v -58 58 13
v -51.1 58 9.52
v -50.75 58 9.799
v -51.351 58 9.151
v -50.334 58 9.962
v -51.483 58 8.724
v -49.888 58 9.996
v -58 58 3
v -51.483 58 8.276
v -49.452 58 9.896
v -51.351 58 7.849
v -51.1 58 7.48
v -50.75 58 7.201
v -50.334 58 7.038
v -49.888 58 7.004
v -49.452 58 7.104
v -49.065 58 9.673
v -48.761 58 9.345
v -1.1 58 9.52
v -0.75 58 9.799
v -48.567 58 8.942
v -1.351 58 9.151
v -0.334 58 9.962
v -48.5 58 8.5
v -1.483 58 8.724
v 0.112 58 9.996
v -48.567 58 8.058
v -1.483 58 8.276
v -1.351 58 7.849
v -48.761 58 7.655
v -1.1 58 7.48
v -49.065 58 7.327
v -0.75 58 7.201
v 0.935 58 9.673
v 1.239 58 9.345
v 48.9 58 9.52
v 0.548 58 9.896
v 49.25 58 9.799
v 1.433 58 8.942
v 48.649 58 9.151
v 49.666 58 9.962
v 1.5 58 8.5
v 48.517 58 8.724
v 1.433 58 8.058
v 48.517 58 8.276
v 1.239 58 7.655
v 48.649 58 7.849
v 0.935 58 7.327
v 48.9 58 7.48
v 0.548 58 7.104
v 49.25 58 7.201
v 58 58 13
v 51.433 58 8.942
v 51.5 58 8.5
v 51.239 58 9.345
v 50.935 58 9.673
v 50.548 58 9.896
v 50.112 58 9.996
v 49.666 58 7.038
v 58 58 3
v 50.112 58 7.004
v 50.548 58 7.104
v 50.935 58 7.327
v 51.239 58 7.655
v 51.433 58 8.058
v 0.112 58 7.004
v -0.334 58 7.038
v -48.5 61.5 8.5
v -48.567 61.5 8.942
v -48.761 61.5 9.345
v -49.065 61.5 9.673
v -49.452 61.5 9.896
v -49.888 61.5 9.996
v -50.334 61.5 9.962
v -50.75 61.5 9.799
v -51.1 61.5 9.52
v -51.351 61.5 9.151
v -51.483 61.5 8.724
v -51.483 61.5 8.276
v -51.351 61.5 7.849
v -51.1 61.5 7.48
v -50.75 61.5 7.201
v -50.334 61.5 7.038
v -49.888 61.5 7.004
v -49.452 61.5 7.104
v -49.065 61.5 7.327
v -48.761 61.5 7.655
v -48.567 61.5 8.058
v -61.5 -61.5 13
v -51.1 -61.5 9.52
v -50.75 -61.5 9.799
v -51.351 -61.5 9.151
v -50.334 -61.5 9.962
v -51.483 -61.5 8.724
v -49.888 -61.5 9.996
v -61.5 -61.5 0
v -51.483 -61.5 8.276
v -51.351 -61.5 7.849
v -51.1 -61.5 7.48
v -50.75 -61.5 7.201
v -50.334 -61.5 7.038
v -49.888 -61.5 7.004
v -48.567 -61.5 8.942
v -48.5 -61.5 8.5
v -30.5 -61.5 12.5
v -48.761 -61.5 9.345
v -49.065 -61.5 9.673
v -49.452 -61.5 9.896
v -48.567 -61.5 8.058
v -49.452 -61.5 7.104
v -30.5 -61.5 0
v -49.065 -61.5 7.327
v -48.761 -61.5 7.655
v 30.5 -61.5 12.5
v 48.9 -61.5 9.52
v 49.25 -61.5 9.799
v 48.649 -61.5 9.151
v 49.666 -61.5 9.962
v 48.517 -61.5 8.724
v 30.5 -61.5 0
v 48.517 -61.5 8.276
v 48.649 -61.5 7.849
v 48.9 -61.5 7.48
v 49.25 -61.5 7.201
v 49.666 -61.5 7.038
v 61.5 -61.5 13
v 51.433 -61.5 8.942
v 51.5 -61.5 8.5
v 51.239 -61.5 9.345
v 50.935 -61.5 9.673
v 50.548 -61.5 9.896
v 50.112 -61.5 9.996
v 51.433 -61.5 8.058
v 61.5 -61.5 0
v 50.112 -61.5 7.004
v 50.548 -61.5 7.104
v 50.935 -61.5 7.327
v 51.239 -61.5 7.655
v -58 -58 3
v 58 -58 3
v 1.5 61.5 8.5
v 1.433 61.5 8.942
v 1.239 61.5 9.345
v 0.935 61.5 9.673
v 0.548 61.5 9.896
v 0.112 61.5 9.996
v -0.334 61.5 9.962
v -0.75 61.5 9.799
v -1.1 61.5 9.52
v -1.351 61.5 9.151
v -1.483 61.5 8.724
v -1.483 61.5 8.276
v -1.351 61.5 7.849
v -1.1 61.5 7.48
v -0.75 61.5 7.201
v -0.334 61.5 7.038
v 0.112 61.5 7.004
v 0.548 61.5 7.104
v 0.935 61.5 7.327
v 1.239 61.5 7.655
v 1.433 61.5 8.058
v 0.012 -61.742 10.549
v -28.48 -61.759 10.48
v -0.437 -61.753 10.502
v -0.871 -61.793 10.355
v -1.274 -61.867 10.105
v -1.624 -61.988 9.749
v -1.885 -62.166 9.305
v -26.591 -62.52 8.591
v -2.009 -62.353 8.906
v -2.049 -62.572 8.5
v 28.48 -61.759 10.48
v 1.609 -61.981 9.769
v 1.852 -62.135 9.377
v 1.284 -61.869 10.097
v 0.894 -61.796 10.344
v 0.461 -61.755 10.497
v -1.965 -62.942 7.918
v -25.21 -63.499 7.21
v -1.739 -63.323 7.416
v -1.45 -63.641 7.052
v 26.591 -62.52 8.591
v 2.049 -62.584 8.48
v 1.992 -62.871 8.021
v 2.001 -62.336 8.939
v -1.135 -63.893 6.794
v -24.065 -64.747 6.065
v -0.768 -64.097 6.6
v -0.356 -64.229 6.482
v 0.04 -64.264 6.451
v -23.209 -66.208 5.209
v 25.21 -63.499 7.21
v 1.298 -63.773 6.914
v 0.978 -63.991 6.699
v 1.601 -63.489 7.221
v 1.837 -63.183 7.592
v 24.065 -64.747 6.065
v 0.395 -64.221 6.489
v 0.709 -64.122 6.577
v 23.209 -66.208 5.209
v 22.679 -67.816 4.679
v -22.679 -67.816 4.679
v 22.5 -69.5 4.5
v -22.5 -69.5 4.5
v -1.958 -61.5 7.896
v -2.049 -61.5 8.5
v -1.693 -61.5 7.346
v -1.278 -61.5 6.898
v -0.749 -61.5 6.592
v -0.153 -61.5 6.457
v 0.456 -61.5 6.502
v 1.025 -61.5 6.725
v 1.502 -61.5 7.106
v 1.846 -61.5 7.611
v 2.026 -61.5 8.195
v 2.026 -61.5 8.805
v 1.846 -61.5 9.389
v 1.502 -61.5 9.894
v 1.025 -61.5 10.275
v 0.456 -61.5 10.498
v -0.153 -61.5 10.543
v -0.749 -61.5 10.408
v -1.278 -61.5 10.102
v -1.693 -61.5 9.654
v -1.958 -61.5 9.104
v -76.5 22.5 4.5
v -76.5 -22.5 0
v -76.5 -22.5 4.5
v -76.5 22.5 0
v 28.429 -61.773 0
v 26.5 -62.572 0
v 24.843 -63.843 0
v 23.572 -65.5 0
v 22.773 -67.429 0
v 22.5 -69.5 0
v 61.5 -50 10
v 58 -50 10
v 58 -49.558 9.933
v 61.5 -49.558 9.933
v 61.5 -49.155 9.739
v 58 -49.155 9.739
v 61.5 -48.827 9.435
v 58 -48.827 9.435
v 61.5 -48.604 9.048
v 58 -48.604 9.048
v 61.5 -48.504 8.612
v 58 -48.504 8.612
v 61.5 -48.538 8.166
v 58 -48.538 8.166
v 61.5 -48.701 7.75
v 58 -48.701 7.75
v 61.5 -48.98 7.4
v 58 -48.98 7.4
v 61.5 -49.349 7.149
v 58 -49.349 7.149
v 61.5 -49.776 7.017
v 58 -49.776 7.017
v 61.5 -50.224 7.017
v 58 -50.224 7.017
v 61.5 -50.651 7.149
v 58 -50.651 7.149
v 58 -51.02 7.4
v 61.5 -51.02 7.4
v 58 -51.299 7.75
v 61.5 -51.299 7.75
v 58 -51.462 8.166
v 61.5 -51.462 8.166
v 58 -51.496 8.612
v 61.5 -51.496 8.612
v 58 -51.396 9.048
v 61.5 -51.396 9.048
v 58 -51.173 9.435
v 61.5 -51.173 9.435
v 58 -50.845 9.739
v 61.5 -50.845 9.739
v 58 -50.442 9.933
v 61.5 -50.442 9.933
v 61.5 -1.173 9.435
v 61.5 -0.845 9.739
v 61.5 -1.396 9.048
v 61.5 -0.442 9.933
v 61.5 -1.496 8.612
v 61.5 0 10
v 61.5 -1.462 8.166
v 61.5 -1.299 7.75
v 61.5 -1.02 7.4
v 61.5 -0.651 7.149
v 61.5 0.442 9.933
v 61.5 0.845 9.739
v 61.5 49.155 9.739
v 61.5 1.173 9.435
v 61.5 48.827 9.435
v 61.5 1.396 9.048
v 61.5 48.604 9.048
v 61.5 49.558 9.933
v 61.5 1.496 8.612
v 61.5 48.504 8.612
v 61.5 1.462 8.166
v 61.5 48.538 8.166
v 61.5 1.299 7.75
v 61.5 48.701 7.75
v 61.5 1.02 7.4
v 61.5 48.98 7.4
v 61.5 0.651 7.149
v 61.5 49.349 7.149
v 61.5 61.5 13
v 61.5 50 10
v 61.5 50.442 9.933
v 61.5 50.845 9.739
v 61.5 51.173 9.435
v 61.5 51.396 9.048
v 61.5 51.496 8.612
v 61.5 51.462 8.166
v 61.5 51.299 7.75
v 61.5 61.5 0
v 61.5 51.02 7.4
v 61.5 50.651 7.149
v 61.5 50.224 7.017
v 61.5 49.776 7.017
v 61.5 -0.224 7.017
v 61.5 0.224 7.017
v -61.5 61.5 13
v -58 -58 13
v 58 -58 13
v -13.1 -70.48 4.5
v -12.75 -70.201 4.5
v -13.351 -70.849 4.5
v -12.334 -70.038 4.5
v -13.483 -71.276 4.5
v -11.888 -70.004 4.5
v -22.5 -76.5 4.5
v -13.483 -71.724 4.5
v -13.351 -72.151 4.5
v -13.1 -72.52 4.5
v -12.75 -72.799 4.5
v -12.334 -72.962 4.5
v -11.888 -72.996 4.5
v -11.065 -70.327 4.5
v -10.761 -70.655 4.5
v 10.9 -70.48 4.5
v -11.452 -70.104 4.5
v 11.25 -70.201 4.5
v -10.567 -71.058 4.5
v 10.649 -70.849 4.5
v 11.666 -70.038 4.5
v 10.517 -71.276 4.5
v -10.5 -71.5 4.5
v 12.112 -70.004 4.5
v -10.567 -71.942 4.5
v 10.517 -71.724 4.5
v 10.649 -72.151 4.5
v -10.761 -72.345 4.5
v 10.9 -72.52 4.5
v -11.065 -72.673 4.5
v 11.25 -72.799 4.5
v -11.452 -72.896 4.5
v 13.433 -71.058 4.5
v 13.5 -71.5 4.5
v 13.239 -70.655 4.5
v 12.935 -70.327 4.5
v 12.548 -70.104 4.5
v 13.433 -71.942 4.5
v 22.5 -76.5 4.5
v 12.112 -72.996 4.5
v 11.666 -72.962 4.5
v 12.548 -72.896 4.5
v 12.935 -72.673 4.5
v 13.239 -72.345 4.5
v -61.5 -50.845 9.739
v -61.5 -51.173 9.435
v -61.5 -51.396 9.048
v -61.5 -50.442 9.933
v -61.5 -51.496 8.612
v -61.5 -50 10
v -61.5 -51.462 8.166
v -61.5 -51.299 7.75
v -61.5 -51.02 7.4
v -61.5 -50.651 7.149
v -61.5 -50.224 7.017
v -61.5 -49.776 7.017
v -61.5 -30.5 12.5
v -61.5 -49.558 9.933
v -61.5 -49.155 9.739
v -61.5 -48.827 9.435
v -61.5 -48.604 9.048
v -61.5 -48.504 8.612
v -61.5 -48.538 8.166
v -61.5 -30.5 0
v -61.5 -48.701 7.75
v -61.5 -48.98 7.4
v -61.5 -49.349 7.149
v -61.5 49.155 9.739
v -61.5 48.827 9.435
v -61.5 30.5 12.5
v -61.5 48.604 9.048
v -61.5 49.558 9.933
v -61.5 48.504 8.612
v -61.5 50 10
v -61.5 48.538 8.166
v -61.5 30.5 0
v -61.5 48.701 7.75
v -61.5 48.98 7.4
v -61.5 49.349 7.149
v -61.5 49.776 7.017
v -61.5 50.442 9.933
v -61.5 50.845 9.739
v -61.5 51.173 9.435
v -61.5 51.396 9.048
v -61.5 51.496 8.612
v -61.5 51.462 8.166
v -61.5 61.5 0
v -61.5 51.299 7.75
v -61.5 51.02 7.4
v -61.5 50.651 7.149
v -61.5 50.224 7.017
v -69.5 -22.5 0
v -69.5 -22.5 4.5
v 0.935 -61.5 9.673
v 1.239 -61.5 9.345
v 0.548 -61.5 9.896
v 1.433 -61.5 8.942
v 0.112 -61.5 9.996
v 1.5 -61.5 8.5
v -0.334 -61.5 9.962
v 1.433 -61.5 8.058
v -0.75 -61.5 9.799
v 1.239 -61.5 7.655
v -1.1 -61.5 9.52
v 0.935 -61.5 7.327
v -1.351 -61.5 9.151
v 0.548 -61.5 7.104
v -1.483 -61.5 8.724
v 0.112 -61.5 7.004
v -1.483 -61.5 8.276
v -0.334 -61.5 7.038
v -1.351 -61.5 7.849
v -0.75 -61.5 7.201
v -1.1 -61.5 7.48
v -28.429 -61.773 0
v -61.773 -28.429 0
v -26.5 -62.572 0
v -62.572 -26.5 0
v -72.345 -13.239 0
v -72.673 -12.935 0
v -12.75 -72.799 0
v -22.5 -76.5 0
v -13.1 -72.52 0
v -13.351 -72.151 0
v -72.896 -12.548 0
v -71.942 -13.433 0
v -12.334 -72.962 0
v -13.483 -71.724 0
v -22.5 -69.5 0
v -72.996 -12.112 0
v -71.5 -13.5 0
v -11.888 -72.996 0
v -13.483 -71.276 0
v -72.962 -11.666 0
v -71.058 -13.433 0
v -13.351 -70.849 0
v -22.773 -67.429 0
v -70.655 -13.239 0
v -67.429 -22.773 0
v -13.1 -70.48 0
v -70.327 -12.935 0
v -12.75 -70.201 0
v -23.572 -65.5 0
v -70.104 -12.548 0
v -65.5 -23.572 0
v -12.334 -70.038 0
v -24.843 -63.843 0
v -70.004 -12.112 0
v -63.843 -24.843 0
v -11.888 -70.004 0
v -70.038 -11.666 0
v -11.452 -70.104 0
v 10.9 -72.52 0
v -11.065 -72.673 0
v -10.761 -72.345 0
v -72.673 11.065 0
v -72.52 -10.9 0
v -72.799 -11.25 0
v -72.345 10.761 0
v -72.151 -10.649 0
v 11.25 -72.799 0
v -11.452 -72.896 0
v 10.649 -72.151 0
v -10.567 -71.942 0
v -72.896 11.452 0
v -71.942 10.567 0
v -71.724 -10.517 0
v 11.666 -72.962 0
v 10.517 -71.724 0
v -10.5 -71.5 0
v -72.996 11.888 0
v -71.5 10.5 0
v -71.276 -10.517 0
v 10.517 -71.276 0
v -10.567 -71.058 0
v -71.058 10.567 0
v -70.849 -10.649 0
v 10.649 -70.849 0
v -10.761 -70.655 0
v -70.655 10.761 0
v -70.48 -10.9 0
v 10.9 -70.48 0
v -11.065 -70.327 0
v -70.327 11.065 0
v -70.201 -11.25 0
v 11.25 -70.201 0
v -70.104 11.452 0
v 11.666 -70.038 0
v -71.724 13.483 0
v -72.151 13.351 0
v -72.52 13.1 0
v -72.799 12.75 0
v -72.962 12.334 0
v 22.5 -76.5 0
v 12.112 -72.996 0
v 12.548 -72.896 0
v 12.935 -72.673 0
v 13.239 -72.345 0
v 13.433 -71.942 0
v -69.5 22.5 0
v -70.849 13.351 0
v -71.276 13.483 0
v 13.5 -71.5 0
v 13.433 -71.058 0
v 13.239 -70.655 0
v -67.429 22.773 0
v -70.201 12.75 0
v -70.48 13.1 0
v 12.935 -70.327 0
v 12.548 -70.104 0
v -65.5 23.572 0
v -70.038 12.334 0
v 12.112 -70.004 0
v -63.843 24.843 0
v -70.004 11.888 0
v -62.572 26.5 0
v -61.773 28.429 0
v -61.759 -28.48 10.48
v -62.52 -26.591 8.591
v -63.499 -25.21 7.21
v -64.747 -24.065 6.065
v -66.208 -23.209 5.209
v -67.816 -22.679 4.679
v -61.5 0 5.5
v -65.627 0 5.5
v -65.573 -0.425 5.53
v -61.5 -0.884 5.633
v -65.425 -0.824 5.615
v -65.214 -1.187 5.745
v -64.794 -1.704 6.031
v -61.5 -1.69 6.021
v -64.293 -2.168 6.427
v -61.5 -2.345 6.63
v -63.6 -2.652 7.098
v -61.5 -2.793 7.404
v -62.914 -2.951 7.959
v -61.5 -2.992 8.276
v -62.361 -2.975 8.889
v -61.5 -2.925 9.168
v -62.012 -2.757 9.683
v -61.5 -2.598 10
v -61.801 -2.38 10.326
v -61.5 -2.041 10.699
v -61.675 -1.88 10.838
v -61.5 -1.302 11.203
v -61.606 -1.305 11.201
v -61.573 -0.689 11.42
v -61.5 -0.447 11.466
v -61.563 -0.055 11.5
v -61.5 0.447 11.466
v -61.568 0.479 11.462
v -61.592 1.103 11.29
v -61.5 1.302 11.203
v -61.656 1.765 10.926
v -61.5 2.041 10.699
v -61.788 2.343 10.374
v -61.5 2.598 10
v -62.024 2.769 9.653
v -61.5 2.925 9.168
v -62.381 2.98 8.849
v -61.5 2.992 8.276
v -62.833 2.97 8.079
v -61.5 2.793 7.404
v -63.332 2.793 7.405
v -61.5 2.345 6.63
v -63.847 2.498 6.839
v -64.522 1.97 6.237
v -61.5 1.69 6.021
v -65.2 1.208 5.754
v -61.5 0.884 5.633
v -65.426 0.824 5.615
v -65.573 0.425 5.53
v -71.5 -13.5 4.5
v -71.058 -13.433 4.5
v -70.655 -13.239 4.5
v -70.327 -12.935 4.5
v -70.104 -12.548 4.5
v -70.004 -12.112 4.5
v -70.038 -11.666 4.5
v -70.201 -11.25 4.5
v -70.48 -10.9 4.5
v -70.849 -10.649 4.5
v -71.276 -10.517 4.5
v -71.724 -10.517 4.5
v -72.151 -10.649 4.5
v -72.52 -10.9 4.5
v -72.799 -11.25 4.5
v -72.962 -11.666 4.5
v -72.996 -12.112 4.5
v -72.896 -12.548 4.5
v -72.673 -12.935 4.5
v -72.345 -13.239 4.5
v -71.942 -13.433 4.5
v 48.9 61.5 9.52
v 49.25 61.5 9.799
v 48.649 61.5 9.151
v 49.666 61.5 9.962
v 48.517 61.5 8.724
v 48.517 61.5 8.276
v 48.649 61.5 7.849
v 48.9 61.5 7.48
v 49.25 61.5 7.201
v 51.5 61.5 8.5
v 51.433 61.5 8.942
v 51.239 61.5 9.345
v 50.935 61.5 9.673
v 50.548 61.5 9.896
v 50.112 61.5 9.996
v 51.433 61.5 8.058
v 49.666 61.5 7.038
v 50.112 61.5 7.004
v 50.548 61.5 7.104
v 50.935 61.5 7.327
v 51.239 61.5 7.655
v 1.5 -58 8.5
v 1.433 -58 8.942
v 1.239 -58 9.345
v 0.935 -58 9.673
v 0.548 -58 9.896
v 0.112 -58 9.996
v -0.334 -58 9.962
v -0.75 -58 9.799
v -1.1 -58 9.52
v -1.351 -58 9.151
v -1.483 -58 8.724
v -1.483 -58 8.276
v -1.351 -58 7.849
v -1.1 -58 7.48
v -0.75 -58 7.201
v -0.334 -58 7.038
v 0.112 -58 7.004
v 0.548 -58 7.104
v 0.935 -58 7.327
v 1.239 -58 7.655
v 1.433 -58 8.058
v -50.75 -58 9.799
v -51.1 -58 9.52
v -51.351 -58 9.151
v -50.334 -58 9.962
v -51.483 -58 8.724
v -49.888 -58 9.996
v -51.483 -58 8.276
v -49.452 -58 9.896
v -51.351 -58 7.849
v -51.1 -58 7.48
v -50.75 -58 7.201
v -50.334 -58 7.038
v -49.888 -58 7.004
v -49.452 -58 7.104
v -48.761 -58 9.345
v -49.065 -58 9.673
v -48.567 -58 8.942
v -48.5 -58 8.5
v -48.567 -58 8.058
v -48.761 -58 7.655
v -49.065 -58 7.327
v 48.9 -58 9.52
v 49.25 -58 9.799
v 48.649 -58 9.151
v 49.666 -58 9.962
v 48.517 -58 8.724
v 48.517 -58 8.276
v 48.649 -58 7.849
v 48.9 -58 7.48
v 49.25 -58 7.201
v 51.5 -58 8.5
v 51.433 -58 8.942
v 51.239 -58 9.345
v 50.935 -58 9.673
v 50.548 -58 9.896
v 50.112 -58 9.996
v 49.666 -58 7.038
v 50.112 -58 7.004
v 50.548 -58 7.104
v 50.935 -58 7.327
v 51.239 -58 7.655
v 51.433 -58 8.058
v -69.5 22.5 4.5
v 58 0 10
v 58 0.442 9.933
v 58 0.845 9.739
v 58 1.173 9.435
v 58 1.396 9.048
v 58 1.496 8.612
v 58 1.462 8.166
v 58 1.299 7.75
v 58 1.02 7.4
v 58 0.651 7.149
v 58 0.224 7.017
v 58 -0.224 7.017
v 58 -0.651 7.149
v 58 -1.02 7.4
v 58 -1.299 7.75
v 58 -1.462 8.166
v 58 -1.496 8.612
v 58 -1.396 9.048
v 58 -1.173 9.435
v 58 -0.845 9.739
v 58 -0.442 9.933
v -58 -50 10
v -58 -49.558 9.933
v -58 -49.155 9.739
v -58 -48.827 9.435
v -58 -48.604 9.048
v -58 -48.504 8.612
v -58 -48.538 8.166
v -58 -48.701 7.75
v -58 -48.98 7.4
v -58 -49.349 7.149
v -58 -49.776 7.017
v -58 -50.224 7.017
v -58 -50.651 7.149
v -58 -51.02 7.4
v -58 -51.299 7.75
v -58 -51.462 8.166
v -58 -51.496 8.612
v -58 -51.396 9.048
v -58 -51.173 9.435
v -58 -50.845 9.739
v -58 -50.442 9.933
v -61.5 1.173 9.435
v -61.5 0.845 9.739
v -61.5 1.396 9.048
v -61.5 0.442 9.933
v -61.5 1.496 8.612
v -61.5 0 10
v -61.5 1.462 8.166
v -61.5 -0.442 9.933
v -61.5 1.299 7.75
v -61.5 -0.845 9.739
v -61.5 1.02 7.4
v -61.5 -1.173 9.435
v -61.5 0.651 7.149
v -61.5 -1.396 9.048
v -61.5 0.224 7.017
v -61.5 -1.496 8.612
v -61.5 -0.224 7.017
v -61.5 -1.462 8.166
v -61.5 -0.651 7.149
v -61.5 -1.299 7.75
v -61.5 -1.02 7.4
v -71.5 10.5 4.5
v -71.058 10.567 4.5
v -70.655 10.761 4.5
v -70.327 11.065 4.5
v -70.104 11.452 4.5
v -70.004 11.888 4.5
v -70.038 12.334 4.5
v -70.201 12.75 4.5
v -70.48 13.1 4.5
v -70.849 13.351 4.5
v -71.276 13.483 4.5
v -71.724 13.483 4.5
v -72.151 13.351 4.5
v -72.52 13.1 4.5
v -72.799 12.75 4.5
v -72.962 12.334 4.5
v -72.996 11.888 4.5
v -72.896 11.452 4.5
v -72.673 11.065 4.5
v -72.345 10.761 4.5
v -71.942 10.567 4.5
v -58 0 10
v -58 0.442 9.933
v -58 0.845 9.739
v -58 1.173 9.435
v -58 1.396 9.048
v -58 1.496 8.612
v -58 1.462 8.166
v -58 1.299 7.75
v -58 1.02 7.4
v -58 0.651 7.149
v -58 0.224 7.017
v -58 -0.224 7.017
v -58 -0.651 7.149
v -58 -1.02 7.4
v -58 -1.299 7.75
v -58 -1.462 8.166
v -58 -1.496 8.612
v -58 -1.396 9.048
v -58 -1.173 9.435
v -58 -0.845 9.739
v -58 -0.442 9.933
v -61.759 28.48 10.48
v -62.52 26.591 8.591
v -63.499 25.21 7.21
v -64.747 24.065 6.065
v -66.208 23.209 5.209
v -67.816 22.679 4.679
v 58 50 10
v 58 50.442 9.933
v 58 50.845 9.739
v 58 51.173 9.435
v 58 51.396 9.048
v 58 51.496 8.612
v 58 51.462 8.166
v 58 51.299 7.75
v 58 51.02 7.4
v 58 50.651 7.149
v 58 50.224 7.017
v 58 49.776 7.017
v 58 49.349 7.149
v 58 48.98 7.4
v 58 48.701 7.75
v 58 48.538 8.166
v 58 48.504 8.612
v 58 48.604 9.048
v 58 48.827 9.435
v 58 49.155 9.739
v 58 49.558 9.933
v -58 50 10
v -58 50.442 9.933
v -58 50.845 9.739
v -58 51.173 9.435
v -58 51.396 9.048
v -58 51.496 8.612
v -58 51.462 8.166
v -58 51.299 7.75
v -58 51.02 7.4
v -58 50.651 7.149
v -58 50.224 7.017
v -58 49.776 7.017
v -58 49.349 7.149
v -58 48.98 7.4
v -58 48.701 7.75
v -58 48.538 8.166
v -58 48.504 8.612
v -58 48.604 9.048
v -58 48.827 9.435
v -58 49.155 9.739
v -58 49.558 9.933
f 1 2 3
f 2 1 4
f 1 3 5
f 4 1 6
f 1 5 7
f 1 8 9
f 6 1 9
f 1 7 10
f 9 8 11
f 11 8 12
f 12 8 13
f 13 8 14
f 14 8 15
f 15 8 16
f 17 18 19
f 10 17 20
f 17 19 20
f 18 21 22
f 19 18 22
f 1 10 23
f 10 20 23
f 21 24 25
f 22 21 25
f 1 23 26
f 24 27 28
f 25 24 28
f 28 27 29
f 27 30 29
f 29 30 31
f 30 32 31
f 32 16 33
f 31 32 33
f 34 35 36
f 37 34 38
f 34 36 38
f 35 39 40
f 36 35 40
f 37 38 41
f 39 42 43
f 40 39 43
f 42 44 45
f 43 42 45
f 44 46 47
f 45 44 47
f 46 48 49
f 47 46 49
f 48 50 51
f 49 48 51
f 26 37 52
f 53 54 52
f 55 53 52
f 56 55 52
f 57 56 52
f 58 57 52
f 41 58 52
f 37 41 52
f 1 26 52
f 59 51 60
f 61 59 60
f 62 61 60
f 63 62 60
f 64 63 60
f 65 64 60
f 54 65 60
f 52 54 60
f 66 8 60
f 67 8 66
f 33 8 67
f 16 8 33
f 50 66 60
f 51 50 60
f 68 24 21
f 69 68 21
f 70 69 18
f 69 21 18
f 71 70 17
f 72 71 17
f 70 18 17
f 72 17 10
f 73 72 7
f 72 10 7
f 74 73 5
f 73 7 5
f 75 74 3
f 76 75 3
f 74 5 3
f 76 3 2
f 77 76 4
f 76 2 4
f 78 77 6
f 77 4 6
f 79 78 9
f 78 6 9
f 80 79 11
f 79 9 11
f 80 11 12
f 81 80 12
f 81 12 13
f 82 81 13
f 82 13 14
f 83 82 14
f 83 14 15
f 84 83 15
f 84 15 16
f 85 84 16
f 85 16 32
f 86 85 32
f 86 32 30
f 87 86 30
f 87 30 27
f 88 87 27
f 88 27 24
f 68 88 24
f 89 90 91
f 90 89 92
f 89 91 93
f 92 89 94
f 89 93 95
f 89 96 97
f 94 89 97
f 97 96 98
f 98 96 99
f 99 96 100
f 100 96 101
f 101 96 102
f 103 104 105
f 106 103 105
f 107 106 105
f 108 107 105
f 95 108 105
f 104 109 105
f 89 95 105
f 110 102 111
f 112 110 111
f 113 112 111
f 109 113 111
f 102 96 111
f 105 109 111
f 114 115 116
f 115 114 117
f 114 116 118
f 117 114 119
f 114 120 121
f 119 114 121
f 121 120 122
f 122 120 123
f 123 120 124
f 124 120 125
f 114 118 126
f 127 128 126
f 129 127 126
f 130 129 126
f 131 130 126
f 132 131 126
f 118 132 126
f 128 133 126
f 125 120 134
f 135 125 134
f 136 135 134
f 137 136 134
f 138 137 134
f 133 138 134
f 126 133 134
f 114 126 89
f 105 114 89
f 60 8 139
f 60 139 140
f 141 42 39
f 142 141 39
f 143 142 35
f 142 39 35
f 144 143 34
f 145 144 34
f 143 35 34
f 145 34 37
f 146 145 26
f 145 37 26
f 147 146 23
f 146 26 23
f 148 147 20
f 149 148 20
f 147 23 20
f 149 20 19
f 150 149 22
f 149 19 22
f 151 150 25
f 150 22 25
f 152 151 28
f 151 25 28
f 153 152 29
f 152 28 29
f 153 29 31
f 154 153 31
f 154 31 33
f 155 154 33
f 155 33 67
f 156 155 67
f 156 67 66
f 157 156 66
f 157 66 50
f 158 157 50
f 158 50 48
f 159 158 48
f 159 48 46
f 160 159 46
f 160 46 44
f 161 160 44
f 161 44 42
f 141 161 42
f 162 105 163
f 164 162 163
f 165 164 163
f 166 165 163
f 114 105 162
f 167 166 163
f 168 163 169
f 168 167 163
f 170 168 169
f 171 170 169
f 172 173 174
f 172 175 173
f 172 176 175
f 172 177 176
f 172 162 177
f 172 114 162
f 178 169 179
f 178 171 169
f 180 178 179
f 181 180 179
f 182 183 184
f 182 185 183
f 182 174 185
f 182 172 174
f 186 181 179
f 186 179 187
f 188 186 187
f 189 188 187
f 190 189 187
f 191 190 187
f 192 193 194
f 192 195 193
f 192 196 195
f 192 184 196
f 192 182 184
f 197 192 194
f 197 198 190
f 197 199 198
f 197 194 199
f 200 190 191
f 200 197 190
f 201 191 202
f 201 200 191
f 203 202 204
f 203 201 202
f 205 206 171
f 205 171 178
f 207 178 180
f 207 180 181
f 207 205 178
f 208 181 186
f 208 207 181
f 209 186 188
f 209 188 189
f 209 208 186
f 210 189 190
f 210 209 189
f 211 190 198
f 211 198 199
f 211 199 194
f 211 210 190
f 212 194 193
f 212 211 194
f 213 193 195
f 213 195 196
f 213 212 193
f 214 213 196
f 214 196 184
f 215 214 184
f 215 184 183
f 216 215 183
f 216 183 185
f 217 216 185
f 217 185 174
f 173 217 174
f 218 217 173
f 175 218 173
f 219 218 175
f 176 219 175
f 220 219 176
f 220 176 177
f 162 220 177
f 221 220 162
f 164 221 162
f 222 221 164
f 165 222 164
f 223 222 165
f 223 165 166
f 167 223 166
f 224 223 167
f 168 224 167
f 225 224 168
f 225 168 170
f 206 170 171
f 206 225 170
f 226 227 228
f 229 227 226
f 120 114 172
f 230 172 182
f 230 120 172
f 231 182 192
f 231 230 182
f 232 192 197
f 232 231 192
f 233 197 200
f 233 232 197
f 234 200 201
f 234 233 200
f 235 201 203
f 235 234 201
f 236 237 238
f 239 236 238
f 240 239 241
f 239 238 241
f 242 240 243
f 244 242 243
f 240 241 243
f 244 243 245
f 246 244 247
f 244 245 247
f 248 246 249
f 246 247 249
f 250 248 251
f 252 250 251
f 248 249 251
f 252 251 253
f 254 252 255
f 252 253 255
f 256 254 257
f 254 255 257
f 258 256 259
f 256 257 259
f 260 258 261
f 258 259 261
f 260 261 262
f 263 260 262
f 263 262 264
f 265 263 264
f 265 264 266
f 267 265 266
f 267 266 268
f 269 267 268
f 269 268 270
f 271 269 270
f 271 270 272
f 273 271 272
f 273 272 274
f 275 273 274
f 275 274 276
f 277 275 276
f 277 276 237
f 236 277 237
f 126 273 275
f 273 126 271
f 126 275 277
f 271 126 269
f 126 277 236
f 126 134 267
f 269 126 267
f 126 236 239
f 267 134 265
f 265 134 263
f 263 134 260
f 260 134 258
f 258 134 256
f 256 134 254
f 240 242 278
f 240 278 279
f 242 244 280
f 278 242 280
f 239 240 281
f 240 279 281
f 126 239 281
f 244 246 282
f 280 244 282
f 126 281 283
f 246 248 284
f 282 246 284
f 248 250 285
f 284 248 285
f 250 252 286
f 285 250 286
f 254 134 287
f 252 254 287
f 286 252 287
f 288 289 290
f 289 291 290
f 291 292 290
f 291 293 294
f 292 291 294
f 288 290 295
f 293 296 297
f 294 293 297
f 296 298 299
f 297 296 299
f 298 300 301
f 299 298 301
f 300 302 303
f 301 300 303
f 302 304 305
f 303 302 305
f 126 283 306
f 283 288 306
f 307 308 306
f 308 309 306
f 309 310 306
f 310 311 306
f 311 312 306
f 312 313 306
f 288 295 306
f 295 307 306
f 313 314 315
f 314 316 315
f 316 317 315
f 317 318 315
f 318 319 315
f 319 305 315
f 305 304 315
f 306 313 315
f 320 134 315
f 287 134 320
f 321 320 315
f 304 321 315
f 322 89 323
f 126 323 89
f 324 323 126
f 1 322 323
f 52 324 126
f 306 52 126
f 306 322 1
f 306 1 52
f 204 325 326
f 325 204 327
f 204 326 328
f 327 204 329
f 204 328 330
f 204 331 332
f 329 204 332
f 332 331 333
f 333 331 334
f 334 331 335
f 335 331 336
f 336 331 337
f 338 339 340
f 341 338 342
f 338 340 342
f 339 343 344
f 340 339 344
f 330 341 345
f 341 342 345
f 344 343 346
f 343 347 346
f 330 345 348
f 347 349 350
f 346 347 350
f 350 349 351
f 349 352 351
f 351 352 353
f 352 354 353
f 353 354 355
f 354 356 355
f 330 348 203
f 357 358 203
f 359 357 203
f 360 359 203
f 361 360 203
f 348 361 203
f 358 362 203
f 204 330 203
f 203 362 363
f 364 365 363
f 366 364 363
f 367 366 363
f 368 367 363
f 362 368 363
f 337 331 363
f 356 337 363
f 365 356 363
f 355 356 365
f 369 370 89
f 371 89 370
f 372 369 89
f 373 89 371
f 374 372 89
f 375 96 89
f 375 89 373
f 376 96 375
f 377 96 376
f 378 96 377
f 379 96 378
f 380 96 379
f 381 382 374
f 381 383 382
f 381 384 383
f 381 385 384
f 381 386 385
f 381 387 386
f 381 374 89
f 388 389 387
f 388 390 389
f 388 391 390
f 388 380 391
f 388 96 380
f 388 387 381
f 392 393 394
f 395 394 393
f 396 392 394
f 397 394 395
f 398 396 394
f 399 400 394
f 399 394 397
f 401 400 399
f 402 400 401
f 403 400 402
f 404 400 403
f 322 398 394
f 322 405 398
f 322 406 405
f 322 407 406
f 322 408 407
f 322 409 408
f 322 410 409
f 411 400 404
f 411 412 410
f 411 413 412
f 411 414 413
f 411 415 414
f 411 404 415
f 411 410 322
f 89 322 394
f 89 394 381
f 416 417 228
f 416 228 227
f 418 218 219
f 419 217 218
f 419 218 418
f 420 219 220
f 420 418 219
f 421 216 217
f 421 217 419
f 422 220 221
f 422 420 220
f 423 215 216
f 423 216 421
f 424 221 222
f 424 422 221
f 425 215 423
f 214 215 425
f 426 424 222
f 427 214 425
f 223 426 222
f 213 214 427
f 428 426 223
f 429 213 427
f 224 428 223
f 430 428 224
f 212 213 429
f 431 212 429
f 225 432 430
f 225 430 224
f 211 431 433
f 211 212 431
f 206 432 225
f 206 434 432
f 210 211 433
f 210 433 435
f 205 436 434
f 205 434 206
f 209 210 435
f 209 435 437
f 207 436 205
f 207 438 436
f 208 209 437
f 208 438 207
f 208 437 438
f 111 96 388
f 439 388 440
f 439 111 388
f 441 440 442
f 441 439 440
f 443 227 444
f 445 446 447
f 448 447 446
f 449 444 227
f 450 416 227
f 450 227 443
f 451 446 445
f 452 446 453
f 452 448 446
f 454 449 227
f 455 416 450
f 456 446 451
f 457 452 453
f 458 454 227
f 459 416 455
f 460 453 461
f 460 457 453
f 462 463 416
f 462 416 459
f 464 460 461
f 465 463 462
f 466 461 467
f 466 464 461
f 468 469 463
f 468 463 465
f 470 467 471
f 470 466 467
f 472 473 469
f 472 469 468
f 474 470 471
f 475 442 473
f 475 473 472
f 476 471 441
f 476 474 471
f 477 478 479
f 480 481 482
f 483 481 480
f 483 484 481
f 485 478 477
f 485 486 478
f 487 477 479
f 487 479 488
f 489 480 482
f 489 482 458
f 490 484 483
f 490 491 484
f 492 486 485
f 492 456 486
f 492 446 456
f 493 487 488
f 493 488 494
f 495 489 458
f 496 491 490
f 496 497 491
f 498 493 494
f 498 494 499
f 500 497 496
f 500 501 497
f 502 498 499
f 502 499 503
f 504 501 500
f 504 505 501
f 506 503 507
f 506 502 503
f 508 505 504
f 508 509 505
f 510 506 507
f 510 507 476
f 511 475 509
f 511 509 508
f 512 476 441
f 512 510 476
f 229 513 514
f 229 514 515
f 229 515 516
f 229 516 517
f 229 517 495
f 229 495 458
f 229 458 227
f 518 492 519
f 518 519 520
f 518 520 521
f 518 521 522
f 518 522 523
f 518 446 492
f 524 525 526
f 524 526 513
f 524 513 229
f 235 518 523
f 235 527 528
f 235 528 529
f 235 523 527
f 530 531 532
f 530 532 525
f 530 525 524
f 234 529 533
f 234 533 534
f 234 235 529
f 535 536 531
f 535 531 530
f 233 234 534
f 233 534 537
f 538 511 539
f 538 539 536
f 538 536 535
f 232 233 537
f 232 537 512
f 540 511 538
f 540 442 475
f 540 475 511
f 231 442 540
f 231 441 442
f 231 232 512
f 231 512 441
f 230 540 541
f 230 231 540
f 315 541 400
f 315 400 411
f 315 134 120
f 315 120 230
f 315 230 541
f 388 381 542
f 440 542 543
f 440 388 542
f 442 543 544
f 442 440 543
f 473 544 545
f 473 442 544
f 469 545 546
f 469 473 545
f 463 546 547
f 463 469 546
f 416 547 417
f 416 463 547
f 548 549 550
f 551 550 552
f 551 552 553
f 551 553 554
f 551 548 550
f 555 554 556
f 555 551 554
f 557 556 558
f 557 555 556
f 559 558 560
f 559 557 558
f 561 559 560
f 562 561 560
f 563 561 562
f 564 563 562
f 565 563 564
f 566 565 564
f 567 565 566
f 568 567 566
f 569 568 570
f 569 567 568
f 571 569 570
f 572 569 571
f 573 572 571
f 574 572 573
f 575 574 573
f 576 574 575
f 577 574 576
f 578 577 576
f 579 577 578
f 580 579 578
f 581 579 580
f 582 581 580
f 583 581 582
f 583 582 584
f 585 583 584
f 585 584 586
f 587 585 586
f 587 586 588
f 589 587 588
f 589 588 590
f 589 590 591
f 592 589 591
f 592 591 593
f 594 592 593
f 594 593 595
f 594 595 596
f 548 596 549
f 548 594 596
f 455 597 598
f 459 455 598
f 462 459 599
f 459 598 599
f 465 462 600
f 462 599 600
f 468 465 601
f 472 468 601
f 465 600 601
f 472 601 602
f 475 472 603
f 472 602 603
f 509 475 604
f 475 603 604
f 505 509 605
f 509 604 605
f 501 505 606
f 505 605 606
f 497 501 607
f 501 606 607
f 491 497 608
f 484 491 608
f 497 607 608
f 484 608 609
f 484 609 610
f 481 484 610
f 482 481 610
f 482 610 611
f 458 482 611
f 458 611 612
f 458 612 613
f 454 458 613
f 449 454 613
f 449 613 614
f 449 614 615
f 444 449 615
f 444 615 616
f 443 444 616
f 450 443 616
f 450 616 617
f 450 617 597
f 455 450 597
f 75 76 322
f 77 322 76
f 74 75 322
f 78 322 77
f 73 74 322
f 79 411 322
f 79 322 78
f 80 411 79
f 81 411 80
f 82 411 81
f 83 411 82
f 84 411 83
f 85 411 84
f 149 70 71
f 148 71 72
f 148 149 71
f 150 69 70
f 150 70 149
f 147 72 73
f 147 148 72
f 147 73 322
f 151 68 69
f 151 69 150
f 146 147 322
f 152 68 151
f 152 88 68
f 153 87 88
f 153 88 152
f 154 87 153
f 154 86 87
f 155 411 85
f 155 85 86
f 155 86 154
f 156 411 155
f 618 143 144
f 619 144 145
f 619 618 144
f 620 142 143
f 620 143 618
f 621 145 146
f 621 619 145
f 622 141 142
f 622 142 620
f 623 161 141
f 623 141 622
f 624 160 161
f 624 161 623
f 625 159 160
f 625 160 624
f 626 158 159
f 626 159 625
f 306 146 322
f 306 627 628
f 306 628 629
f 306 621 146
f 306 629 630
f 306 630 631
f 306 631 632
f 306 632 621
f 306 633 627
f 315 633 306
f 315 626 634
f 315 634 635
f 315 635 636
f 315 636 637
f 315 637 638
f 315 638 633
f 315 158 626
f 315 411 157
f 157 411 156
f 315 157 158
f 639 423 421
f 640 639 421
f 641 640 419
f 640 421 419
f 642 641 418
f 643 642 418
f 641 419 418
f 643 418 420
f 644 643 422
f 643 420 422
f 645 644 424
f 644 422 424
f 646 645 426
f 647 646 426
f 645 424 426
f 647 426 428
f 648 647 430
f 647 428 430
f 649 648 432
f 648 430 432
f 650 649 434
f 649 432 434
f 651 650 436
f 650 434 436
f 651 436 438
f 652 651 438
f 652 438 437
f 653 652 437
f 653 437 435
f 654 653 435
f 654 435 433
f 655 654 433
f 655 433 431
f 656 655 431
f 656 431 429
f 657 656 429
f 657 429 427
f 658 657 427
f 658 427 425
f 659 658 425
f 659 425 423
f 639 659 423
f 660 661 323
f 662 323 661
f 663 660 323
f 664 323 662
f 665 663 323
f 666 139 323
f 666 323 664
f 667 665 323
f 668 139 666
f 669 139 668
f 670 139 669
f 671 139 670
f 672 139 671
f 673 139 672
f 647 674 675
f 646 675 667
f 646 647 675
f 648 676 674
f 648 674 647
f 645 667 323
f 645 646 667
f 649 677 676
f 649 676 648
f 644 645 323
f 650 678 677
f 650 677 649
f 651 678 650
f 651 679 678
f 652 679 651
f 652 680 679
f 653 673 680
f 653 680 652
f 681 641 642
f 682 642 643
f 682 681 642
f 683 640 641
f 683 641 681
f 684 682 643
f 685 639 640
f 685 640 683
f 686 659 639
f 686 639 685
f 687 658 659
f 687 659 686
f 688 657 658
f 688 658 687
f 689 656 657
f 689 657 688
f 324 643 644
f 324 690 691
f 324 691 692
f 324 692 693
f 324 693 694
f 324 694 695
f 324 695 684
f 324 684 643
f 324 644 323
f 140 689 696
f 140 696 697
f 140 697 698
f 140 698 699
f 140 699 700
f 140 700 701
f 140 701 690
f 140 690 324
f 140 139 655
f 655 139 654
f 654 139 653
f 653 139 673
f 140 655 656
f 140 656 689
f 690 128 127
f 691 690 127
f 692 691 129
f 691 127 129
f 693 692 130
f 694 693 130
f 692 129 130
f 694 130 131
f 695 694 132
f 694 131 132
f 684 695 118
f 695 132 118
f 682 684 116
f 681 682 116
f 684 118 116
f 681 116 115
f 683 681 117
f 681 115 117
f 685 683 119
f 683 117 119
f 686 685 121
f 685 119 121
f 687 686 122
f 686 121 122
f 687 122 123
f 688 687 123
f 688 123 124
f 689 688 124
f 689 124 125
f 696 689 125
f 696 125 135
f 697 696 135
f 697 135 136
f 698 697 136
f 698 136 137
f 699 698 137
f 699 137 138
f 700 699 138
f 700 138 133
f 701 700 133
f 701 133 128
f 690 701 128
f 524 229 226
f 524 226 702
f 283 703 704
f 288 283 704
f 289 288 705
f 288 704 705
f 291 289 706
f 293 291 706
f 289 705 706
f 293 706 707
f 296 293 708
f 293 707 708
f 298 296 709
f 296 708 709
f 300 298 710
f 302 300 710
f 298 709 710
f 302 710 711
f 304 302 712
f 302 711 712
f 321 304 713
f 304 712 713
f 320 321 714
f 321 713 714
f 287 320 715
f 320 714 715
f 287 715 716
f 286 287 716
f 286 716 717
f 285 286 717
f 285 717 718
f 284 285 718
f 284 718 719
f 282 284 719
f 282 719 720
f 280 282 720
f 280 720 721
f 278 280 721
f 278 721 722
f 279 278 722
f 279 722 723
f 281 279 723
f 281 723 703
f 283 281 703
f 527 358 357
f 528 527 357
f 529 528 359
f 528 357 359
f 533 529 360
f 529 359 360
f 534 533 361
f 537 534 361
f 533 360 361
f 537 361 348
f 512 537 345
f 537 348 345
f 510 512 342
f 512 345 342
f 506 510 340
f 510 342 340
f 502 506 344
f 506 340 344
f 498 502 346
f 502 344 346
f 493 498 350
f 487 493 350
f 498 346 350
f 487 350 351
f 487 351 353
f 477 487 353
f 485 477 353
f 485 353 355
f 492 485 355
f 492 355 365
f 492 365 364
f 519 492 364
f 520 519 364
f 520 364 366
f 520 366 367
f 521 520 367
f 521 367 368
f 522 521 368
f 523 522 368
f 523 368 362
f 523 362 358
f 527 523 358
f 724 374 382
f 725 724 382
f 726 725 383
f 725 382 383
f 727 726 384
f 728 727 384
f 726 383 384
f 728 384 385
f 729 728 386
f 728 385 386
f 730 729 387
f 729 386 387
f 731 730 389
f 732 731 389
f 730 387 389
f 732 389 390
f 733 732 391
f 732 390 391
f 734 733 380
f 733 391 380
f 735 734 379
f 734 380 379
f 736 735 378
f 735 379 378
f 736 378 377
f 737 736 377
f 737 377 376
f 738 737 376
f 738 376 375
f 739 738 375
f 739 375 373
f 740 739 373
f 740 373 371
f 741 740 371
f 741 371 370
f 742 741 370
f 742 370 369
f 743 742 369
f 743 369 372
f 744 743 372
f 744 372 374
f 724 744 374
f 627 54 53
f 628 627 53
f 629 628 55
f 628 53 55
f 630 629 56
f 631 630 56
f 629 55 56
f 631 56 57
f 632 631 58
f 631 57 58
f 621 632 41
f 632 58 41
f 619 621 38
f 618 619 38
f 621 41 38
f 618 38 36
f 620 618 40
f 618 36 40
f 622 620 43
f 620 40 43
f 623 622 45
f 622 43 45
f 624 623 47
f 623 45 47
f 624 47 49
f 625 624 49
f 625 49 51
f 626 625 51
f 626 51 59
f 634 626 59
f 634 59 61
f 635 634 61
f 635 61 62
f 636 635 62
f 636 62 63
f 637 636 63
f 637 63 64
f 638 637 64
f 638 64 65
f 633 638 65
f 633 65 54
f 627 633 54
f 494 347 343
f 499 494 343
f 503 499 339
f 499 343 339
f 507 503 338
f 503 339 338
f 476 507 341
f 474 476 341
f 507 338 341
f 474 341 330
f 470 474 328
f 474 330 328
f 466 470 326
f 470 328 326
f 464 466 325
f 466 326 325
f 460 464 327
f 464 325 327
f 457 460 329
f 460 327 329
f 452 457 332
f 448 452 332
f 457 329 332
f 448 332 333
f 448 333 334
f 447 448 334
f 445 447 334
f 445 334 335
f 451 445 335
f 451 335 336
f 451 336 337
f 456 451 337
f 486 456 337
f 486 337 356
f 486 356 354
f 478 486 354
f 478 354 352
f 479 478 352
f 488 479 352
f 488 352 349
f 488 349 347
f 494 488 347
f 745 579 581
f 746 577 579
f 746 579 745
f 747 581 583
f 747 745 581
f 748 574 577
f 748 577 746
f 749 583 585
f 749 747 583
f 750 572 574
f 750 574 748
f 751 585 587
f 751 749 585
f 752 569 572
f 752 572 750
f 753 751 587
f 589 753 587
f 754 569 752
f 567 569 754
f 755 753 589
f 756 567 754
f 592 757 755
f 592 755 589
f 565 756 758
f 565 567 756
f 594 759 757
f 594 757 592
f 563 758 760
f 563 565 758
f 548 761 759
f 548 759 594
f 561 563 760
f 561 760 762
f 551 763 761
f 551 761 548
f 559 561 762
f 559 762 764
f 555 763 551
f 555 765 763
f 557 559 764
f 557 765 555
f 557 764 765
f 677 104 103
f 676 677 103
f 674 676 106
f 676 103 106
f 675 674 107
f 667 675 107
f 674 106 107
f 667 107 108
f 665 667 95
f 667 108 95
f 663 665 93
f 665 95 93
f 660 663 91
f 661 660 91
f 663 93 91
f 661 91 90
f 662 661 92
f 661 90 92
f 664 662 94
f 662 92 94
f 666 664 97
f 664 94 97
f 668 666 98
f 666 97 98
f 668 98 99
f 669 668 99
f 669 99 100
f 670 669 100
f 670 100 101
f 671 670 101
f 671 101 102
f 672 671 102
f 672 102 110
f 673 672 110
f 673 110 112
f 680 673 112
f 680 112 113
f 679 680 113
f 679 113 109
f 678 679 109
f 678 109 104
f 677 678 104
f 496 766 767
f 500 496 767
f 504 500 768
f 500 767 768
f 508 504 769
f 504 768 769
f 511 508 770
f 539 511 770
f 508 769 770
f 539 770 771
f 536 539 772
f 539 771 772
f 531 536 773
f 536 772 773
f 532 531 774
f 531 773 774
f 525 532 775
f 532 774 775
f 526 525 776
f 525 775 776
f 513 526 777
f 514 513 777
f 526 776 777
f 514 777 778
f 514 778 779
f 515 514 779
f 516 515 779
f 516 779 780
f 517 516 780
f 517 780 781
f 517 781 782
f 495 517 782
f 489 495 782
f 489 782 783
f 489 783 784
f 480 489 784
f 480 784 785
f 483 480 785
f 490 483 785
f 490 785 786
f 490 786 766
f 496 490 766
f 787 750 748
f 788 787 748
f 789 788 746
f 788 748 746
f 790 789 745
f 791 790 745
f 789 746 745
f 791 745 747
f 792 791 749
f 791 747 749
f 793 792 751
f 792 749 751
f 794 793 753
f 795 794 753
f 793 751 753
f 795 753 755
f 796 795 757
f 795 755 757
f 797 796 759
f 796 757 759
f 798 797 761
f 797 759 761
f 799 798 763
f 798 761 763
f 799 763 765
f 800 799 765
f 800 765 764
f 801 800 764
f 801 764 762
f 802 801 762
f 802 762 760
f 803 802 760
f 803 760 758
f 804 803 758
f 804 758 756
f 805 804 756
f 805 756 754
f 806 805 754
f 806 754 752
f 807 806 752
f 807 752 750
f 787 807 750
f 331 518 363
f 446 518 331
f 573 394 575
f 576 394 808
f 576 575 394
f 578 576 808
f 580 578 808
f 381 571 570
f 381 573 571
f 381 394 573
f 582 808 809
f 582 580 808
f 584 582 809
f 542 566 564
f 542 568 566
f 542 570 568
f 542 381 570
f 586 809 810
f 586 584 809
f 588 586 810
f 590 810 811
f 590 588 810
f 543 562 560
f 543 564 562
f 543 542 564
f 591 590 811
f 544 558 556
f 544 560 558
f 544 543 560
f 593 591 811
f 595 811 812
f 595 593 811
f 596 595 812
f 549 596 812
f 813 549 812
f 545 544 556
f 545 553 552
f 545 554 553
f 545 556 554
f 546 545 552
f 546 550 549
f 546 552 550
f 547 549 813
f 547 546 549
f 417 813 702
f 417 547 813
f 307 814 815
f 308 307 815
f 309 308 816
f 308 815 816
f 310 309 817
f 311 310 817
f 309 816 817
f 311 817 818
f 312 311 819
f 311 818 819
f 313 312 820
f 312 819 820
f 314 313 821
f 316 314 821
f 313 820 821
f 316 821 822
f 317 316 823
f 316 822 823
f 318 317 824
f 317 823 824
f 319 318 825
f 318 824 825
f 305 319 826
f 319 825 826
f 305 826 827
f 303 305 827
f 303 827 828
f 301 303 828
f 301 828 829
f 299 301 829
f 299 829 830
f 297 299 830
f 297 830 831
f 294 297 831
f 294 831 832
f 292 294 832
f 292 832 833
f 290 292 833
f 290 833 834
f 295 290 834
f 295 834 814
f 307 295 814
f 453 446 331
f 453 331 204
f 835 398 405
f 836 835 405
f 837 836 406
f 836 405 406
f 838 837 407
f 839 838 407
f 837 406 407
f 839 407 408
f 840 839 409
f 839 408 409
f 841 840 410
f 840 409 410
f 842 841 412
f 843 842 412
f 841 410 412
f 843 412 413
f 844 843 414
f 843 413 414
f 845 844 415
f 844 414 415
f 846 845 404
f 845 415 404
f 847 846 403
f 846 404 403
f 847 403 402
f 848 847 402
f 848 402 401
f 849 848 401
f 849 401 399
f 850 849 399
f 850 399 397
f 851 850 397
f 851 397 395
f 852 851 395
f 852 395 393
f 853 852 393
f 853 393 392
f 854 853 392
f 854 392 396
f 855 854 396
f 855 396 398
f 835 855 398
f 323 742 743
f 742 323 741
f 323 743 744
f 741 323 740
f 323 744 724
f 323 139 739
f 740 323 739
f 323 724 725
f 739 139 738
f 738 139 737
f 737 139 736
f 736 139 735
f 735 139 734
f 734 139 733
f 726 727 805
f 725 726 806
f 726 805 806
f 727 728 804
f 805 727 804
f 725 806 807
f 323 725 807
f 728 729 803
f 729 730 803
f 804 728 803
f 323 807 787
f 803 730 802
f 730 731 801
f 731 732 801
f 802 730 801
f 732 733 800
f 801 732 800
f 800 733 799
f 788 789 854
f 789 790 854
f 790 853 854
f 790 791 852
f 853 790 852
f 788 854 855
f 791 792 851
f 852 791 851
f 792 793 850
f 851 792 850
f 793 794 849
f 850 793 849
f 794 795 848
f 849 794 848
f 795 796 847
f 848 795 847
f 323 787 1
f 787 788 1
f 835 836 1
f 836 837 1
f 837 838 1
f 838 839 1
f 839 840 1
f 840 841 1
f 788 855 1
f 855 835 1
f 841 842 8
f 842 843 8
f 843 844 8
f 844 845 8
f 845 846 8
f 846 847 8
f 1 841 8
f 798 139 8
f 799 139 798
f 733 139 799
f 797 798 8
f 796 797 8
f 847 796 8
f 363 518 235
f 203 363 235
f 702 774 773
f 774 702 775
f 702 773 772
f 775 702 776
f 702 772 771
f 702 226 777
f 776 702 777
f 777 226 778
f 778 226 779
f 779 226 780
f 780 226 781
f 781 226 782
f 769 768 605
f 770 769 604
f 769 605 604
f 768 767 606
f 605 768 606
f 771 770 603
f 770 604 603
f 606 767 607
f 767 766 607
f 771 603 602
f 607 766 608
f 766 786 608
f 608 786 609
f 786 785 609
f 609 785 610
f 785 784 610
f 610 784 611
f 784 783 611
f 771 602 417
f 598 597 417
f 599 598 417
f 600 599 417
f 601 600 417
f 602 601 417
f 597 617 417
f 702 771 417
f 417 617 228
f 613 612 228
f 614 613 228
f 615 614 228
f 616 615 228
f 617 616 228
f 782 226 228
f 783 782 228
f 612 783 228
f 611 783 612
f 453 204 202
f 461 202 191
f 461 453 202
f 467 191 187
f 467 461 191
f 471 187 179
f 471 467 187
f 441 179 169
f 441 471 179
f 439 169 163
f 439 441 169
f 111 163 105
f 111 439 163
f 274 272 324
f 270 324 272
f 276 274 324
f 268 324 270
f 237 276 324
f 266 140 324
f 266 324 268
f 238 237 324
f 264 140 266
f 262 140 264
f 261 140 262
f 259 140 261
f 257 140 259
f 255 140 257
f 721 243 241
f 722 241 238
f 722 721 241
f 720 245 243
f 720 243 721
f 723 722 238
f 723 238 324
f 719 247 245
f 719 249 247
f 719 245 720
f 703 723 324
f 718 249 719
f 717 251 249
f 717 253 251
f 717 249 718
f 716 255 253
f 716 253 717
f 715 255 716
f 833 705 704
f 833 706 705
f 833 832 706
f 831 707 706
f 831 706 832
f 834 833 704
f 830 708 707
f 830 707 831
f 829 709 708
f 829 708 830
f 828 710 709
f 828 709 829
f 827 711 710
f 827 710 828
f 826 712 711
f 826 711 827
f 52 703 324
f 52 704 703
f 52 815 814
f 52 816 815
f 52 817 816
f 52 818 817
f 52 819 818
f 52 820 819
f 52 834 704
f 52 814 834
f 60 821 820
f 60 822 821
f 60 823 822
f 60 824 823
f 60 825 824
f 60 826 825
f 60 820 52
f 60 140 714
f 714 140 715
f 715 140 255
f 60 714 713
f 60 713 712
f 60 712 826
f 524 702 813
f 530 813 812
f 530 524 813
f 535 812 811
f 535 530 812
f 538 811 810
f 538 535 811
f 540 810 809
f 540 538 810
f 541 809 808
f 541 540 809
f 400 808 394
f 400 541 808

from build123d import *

# Parameters (mm, degrees)
SKETCH_3_W               = 123
SKETCH_3_H               = 123
EXTRUDE_2_DEPTH          = 3
SKETCH_4_W               = 123
SKETCH_4_H               = 123
SKETCH_4_W_2             = 116
SKETCH_4_H_2             = 116
EXTRUDE_3_DEPTH          = 10
SKETCH_7_R               = 1.5
CUT_EXTRUDE_1_DEPTH      = 139.131278138
SKETCH_9_R               = 1.5
CUT_EXTRUDE_2_DEPTH      = 139.131278138
SKETCH_10_W              = 45
SKETCH_10_H              = 15
EXTRUDE_4_DEPTH          = 4.5
SKETCH_11_R              = 1.5
CUT_EXTRUDE_3_DEPTH      = 99.522839992
PATTERN_CIRCULAR_1_COUNT = 2
PATTERN_CIRCULAR_1_ANGLE = 90
FILLET_1_R               = 8
SKETCH_13_R              = 3
CUT_EXTRUDE_4_DEPTH      = 146.431255238
SKETCH_14_R              = 2.049164466
CUT_EXTRUDE_6_DEPTH      = 146.431255238


with BuildPart() as part:
    # 草图3 → 凸台-拉伸2 (new body)
    with BuildSketch(Plane.XY):
        Rectangle(SKETCH_3_W, SKETCH_3_H)
    extrude(amount=EXTRUDE_2_DEPTH)

    # 草图4 → 凸台-拉伸3 (add)
    with BuildSketch(Plane.XY.offset(3)):
        Rectangle(SKETCH_4_W, SKETCH_4_H)
        Rectangle(SKETCH_4_W_2, SKETCH_4_H_2, mode=Mode.SUBTRACT)
    extrude(amount=EXTRUDE_3_DEPTH)

    # 草图7 → 切除-拉伸1 (cut, through all)
    with BuildSketch(Plane.XZ.offset(61.5)):
        with Locations((0, 8.5)):
            Circle(SKETCH_7_R)
        with Locations((50, 8.5)):
            Circle(SKETCH_7_R)
        with Locations((-50, 8.5)):
            Circle(SKETCH_7_R)
    extrude(amount=-CUT_EXTRUDE_1_DEPTH, mode=Mode.SUBTRACT)

    # 草图9 → 切除-拉伸2 (cut, through all)
    with BuildSketch(Plane.ZY.offset(61.5)):
        with Locations((8.5, 0)):
            Circle(SKETCH_9_R)
        with Locations((8.5, -50)):
            Circle(SKETCH_9_R)
        with Locations((8.5, 50)):
            Circle(SKETCH_9_R)
    extrude(amount=-CUT_EXTRUDE_2_DEPTH, mode=Mode.SUBTRACT)

    # 草图10 → 凸台-拉伸4 (add)
    with BuildSketch(Plane(origin=(0, 0, 0), x_dir=(-1, 0, 0), z_dir=(0, 0, -1))):
        with Locations((0, -69)):
            Rectangle(SKETCH_10_W, SKETCH_10_H)
    extrude_4 = extrude(amount=-EXTRUDE_4_DEPTH)

    # 草图11 → 切除-拉伸3 (cut, through all)
    with BuildSketch(Plane.XY.offset(4.5)):
        with Locations((-12, -71.5)):
            Circle(SKETCH_11_R)
        with Locations((12, -71.5)):
            Circle(SKETCH_11_R)
    cut_extrude_3 = extrude(amount=-CUT_EXTRUDE_3_DEPTH, mode=Mode.SUBTRACT)

    # 阵列(圆周)1: 凸台-拉伸4, 切除-拉伸3 ×2 about axis
    pattern_circular_1_axis = Axis((0, 0, 0), (0, 0, -1))
    add([extrude_4.rotate(pattern_circular_1_axis, i * PATTERN_CIRCULAR_1_ANGLE / (PATTERN_CIRCULAR_1_COUNT - 1)) for i in range(1, PATTERN_CIRCULAR_1_COUNT)])
    add([cut_extrude_3.rotate(pattern_circular_1_axis, i * PATTERN_CIRCULAR_1_ANGLE / (PATTERN_CIRCULAR_1_COUNT - 1)) for i in range(1, PATTERN_CIRCULAR_1_COUNT)], mode=Mode.SUBTRACT)

    # 圆角1
    # the kernel refuses this fillet: 8 mm, written as the material it adds along each edge
    with BuildSketch(Plane(origin=(-61.5, 22.5, 0), x_dir=(0, 1, 0), z_dir=(0, 0, 1)), Plane(origin=(-22.5, -61.5, 0), x_dir=(-1, 0, 0), z_dir=(0, 0, 1))) as fillet_1_piece_1:
        with BuildLine():
            CenterArc((FILLET_1_R, FILLET_1_R), FILLET_1_R, 180, 90)
            Line((0, FILLET_1_R), (0, 0))
            Line((0, 0), (FILLET_1_R, 0))
        make_face()
    extrude(amount=4.5)
    with BuildSketch(Plane(origin=(-61.5, -22.5, 4.5), x_dir=(0, 0, 1), z_dir=(0, 1, 0))) as fillet_1_piece_2_section:
        with BuildLine():
            CenterArc((FILLET_1_R, -FILLET_1_R), FILLET_1_R, 90, 90)
            Line((0, -FILLET_1_R), (0, 0))
            Line((0, 0), (FILLET_1_R, 0))
        make_face()
    fillet_1_piece_2 = extrude(amount=45, mode=Mode.PRIVATE)
    fillet_1_piece_2 = fillet_1_piece_2 - Plane(origin=(-63.326853287, 0, 8.5), x_dir=(0, 0, 1), z_dir=(-1, 0, 0)) * Cylinder(1.5, 122, mode=Mode.PRIVATE)
    add(fillet_1_piece_2)
    with BuildSketch(Plane(origin=(-61.5, -22.5, 0), x_dir=(0, -1, 0), z_dir=(0, 0, 1)), Plane(origin=(22.5, -61.5, 0), x_dir=(1, 0, 0), z_dir=(0, 0, 1))) as fillet_1_piece_3:
        with BuildLine():
            CenterArc((FILLET_1_R, -FILLET_1_R), FILLET_1_R, 90, 90)
            Line((0, -FILLET_1_R), (0, 0))
            Line((0, 0), (FILLET_1_R, 0))
        make_face()
    extrude(amount=4.5)
    with BuildSketch(Plane(origin=(22.5, -61.5, 4.5), x_dir=(0, 0, 1), z_dir=(-1, 0, 0))) as fillet_1_piece_4_section:
        with BuildLine():
            CenterArc((FILLET_1_R, -FILLET_1_R), FILLET_1_R, 90, 90)
            Line((0, -FILLET_1_R), (0, 0))
            Line((0, 0), (FILLET_1_R, 0))
        make_face()
    fillet_1_piece_4 = extrude(amount=45, mode=Mode.PRIVATE)
    fillet_1_piece_4 = fillet_1_piece_4 - Plane(origin=(0, -63.326852549, 8.5), x_dir=(1, 0, 0), z_dir=(0, -1, 0)) * Cylinder(1.5, 122, mode=Mode.PRIVATE)
    add(fillet_1_piece_4)
    with BuildSketch(Plane(origin=(-61.5, -22.5, 4.5), x_dir=(0, 0, 1), z_dir=(0, 1, 0))) as fillet_1_piece_5a_section:
        with BuildLine():
            CenterArc((FILLET_1_R, -FILLET_1_R), FILLET_1_R, 90, 90)
            Line((0, -FILLET_1_R), (0, 0))
            Line((0, 0), (FILLET_1_R, 0))
        make_face()
    fillet_1_piece_5a = extrude(amount=65, mode=Mode.PRIVATE)
    fillet_1_piece_5a = split(fillet_1_piece_5a, bisect_by=Plane(origin=(-63.311160914, 22.5, 6.311160914), z_dir=(0, 1, 0)), keep=Keep.TOP, mode=Mode.PRIVATE)
    with BuildSketch(Plane(origin=(-61.5, 22.5, 0), x_dir=(0, 1, 0), z_dir=(0, 0, 1))) as fillet_1_piece_5b_section:
        with BuildLine():
            CenterArc((FILLET_1_R, FILLET_1_R), FILLET_1_R, 180, 90)
            Line((0, FILLET_1_R), (0, 0))
            Line((0, 0), (FILLET_1_R, 0))
        make_face()
    fillet_1_piece_5b = extrude(amount=24.5, mode=Mode.PRIVATE)
    fillet_1_piece_5b = split(fillet_1_piece_5b, bisect_by=Plane(origin=(-63.311160914, 24.311160914, 13), z_dir=(0, 0, -1)), keep=Keep.TOP, mode=Mode.PRIVATE)
    fillet_1_piece_5b = split(fillet_1_piece_5b, bisect_by=Plane(origin=(-63.311160914, 24.311160914, 4.5), z_dir=(0, 0, 1)), keep=Keep.TOP, mode=Mode.PRIVATE)
    fillet_1_piece_5 = fillet_1_piece_5a & fillet_1_piece_5b
    add(fillet_1_piece_5)
    with BuildSketch(Plane(origin=(-61.5, -22.5, 0), x_dir=(0, -1, 0), z_dir=(0, 0, 1))) as fillet_1_piece_6a_section:
        with BuildLine():
            CenterArc((FILLET_1_R, -FILLET_1_R), FILLET_1_R, 90, 90)
            Line((0, -FILLET_1_R), (0, 0))
            Line((0, 0), (FILLET_1_R, 0))
        make_face()
    fillet_1_piece_6a = extrude(amount=24.5, mode=Mode.PRIVATE)
    fillet_1_piece_6a = split(fillet_1_piece_6a, bisect_by=Plane(origin=(-63.311160914, -24.311160914, 13), z_dir=(0, 0, -1)), keep=Keep.TOP, mode=Mode.PRIVATE)
    fillet_1_piece_6a = split(fillet_1_piece_6a, bisect_by=Plane(origin=(-63.311160914, -24.311160914, 4.5), z_dir=(0, 0, 1)), keep=Keep.TOP, mode=Mode.PRIVATE)
    with BuildSketch(Plane(origin=(-61.5, -42.5, 4.5), x_dir=(0, 0, 1), z_dir=(0, 1, 0))) as fillet_1_piece_6b_section:
        with BuildLine():
            CenterArc((FILLET_1_R, -FILLET_1_R), FILLET_1_R, 90, 90)
            Line((0, -FILLET_1_R), (0, 0))
            Line((0, 0), (FILLET_1_R, 0))
        make_face()
    fillet_1_piece_6b = extrude(amount=65, mode=Mode.PRIVATE)
    fillet_1_piece_6b = split(fillet_1_piece_6b, bisect_by=Plane(origin=(-63.311160914, -22.5, 6.311160914), z_dir=(0, -1, 0)), keep=Keep.TOP, mode=Mode.PRIVATE)
    fillet_1_piece_6 = fillet_1_piece_6a & fillet_1_piece_6b
    add(fillet_1_piece_6)
    with BuildSketch(Plane(origin=(22.5, -61.5, 4.5), x_dir=(0, 0, 1), z_dir=(-1, 0, 0))) as fillet_1_piece_7a_section:
        with BuildLine():
            CenterArc((FILLET_1_R, -FILLET_1_R), FILLET_1_R, 90, 90)
            Line((0, -FILLET_1_R), (0, 0))
            Line((0, 0), (FILLET_1_R, 0))
        make_face()
    fillet_1_piece_7a = extrude(amount=65, mode=Mode.PRIVATE)
    fillet_1_piece_7a = split(fillet_1_piece_7a, bisect_by=Plane(origin=(-22.5, -63.311160914, 6.311160914), z_dir=(-1, 0, 0)), keep=Keep.TOP, mode=Mode.PRIVATE)
    with BuildSketch(Plane(origin=(-22.5, -61.5, 0), x_dir=(-1, 0, 0), z_dir=(0, 0, 1))) as fillet_1_piece_7b_section:
        with BuildLine():
            CenterArc((FILLET_1_R, FILLET_1_R), FILLET_1_R, 180, 90)
            Line((0, FILLET_1_R), (0, 0))
            Line((0, 0), (FILLET_1_R, 0))
        make_face()
    fillet_1_piece_7b = extrude(amount=24.5, mode=Mode.PRIVATE)
    fillet_1_piece_7b = split(fillet_1_piece_7b, bisect_by=Plane(origin=(-24.311160914, -63.311160914, 13), z_dir=(0, 0, -1)), keep=Keep.TOP, mode=Mode.PRIVATE)
    fillet_1_piece_7b = split(fillet_1_piece_7b, bisect_by=Plane(origin=(-24.311160914, -63.311160914, 4.5), z_dir=(0, 0, 1)), keep=Keep.TOP, mode=Mode.PRIVATE)
    fillet_1_piece_7 = fillet_1_piece_7a & fillet_1_piece_7b
    add(fillet_1_piece_7)
    with BuildSketch(Plane(origin=(22.5, -61.5, 0), x_dir=(1, 0, 0), z_dir=(0, 0, 1))) as fillet_1_piece_8a_section:
        with BuildLine():
            CenterArc((FILLET_1_R, -FILLET_1_R), FILLET_1_R, 90, 90)
            Line((0, -FILLET_1_R), (0, 0))
            Line((0, 0), (FILLET_1_R, 0))
        make_face()
    fillet_1_piece_8a = extrude(amount=24.5, mode=Mode.PRIVATE)
    fillet_1_piece_8a = split(fillet_1_piece_8a, bisect_by=Plane(origin=(24.311160914, -63.311160914, 13), z_dir=(0, 0, -1)), keep=Keep.TOP, mode=Mode.PRIVATE)
    fillet_1_piece_8a = split(fillet_1_piece_8a, bisect_by=Plane(origin=(24.311160914, -63.311160914, 4.5), z_dir=(0, 0, 1)), keep=Keep.TOP, mode=Mode.PRIVATE)
    with BuildSketch(Plane(origin=(42.5, -61.5, 4.5), x_dir=(0, 0, 1), z_dir=(-1, 0, 0))) as fillet_1_piece_8b_section:
        with BuildLine():
            CenterArc((FILLET_1_R, -FILLET_1_R), FILLET_1_R, 90, 90)
            Line((0, -FILLET_1_R), (0, 0))
            Line((0, 0), (FILLET_1_R, 0))
        make_face()
    fillet_1_piece_8b = extrude(amount=65, mode=Mode.PRIVATE)
    fillet_1_piece_8b = split(fillet_1_piece_8b, bisect_by=Plane(origin=(22.5, -63.311160914, 6.311160914), z_dir=(1, 0, 0)), keep=Keep.TOP, mode=Mode.PRIVATE)
    fillet_1_piece_8 = fillet_1_piece_8a & fillet_1_piece_8b
    add(fillet_1_piece_8)

    # 草图13 → 切除-拉伸4 (cut, through all)
    with BuildSketch(Plane.ZY.offset(61.5)):
        with Locations(Location((8.5, 0, 0), (0, 0, 180))):
            Circle(SKETCH_13_R)
    extrude(amount=CUT_EXTRUDE_4_DEPTH, mode=Mode.SUBTRACT)

    # 草图14 → 切除-拉伸6 (cut, through all)
    with BuildSketch(Plane.XZ.offset(61.5)):
        with Locations(Location((0, 8.5, 0), (0, 0, 180))):
            Circle(SKETCH_14_R)
    extrude(amount=CUT_EXTRUDE_6_DEPTH, mode=Mode.SUBTRACT)


solid = part.part
